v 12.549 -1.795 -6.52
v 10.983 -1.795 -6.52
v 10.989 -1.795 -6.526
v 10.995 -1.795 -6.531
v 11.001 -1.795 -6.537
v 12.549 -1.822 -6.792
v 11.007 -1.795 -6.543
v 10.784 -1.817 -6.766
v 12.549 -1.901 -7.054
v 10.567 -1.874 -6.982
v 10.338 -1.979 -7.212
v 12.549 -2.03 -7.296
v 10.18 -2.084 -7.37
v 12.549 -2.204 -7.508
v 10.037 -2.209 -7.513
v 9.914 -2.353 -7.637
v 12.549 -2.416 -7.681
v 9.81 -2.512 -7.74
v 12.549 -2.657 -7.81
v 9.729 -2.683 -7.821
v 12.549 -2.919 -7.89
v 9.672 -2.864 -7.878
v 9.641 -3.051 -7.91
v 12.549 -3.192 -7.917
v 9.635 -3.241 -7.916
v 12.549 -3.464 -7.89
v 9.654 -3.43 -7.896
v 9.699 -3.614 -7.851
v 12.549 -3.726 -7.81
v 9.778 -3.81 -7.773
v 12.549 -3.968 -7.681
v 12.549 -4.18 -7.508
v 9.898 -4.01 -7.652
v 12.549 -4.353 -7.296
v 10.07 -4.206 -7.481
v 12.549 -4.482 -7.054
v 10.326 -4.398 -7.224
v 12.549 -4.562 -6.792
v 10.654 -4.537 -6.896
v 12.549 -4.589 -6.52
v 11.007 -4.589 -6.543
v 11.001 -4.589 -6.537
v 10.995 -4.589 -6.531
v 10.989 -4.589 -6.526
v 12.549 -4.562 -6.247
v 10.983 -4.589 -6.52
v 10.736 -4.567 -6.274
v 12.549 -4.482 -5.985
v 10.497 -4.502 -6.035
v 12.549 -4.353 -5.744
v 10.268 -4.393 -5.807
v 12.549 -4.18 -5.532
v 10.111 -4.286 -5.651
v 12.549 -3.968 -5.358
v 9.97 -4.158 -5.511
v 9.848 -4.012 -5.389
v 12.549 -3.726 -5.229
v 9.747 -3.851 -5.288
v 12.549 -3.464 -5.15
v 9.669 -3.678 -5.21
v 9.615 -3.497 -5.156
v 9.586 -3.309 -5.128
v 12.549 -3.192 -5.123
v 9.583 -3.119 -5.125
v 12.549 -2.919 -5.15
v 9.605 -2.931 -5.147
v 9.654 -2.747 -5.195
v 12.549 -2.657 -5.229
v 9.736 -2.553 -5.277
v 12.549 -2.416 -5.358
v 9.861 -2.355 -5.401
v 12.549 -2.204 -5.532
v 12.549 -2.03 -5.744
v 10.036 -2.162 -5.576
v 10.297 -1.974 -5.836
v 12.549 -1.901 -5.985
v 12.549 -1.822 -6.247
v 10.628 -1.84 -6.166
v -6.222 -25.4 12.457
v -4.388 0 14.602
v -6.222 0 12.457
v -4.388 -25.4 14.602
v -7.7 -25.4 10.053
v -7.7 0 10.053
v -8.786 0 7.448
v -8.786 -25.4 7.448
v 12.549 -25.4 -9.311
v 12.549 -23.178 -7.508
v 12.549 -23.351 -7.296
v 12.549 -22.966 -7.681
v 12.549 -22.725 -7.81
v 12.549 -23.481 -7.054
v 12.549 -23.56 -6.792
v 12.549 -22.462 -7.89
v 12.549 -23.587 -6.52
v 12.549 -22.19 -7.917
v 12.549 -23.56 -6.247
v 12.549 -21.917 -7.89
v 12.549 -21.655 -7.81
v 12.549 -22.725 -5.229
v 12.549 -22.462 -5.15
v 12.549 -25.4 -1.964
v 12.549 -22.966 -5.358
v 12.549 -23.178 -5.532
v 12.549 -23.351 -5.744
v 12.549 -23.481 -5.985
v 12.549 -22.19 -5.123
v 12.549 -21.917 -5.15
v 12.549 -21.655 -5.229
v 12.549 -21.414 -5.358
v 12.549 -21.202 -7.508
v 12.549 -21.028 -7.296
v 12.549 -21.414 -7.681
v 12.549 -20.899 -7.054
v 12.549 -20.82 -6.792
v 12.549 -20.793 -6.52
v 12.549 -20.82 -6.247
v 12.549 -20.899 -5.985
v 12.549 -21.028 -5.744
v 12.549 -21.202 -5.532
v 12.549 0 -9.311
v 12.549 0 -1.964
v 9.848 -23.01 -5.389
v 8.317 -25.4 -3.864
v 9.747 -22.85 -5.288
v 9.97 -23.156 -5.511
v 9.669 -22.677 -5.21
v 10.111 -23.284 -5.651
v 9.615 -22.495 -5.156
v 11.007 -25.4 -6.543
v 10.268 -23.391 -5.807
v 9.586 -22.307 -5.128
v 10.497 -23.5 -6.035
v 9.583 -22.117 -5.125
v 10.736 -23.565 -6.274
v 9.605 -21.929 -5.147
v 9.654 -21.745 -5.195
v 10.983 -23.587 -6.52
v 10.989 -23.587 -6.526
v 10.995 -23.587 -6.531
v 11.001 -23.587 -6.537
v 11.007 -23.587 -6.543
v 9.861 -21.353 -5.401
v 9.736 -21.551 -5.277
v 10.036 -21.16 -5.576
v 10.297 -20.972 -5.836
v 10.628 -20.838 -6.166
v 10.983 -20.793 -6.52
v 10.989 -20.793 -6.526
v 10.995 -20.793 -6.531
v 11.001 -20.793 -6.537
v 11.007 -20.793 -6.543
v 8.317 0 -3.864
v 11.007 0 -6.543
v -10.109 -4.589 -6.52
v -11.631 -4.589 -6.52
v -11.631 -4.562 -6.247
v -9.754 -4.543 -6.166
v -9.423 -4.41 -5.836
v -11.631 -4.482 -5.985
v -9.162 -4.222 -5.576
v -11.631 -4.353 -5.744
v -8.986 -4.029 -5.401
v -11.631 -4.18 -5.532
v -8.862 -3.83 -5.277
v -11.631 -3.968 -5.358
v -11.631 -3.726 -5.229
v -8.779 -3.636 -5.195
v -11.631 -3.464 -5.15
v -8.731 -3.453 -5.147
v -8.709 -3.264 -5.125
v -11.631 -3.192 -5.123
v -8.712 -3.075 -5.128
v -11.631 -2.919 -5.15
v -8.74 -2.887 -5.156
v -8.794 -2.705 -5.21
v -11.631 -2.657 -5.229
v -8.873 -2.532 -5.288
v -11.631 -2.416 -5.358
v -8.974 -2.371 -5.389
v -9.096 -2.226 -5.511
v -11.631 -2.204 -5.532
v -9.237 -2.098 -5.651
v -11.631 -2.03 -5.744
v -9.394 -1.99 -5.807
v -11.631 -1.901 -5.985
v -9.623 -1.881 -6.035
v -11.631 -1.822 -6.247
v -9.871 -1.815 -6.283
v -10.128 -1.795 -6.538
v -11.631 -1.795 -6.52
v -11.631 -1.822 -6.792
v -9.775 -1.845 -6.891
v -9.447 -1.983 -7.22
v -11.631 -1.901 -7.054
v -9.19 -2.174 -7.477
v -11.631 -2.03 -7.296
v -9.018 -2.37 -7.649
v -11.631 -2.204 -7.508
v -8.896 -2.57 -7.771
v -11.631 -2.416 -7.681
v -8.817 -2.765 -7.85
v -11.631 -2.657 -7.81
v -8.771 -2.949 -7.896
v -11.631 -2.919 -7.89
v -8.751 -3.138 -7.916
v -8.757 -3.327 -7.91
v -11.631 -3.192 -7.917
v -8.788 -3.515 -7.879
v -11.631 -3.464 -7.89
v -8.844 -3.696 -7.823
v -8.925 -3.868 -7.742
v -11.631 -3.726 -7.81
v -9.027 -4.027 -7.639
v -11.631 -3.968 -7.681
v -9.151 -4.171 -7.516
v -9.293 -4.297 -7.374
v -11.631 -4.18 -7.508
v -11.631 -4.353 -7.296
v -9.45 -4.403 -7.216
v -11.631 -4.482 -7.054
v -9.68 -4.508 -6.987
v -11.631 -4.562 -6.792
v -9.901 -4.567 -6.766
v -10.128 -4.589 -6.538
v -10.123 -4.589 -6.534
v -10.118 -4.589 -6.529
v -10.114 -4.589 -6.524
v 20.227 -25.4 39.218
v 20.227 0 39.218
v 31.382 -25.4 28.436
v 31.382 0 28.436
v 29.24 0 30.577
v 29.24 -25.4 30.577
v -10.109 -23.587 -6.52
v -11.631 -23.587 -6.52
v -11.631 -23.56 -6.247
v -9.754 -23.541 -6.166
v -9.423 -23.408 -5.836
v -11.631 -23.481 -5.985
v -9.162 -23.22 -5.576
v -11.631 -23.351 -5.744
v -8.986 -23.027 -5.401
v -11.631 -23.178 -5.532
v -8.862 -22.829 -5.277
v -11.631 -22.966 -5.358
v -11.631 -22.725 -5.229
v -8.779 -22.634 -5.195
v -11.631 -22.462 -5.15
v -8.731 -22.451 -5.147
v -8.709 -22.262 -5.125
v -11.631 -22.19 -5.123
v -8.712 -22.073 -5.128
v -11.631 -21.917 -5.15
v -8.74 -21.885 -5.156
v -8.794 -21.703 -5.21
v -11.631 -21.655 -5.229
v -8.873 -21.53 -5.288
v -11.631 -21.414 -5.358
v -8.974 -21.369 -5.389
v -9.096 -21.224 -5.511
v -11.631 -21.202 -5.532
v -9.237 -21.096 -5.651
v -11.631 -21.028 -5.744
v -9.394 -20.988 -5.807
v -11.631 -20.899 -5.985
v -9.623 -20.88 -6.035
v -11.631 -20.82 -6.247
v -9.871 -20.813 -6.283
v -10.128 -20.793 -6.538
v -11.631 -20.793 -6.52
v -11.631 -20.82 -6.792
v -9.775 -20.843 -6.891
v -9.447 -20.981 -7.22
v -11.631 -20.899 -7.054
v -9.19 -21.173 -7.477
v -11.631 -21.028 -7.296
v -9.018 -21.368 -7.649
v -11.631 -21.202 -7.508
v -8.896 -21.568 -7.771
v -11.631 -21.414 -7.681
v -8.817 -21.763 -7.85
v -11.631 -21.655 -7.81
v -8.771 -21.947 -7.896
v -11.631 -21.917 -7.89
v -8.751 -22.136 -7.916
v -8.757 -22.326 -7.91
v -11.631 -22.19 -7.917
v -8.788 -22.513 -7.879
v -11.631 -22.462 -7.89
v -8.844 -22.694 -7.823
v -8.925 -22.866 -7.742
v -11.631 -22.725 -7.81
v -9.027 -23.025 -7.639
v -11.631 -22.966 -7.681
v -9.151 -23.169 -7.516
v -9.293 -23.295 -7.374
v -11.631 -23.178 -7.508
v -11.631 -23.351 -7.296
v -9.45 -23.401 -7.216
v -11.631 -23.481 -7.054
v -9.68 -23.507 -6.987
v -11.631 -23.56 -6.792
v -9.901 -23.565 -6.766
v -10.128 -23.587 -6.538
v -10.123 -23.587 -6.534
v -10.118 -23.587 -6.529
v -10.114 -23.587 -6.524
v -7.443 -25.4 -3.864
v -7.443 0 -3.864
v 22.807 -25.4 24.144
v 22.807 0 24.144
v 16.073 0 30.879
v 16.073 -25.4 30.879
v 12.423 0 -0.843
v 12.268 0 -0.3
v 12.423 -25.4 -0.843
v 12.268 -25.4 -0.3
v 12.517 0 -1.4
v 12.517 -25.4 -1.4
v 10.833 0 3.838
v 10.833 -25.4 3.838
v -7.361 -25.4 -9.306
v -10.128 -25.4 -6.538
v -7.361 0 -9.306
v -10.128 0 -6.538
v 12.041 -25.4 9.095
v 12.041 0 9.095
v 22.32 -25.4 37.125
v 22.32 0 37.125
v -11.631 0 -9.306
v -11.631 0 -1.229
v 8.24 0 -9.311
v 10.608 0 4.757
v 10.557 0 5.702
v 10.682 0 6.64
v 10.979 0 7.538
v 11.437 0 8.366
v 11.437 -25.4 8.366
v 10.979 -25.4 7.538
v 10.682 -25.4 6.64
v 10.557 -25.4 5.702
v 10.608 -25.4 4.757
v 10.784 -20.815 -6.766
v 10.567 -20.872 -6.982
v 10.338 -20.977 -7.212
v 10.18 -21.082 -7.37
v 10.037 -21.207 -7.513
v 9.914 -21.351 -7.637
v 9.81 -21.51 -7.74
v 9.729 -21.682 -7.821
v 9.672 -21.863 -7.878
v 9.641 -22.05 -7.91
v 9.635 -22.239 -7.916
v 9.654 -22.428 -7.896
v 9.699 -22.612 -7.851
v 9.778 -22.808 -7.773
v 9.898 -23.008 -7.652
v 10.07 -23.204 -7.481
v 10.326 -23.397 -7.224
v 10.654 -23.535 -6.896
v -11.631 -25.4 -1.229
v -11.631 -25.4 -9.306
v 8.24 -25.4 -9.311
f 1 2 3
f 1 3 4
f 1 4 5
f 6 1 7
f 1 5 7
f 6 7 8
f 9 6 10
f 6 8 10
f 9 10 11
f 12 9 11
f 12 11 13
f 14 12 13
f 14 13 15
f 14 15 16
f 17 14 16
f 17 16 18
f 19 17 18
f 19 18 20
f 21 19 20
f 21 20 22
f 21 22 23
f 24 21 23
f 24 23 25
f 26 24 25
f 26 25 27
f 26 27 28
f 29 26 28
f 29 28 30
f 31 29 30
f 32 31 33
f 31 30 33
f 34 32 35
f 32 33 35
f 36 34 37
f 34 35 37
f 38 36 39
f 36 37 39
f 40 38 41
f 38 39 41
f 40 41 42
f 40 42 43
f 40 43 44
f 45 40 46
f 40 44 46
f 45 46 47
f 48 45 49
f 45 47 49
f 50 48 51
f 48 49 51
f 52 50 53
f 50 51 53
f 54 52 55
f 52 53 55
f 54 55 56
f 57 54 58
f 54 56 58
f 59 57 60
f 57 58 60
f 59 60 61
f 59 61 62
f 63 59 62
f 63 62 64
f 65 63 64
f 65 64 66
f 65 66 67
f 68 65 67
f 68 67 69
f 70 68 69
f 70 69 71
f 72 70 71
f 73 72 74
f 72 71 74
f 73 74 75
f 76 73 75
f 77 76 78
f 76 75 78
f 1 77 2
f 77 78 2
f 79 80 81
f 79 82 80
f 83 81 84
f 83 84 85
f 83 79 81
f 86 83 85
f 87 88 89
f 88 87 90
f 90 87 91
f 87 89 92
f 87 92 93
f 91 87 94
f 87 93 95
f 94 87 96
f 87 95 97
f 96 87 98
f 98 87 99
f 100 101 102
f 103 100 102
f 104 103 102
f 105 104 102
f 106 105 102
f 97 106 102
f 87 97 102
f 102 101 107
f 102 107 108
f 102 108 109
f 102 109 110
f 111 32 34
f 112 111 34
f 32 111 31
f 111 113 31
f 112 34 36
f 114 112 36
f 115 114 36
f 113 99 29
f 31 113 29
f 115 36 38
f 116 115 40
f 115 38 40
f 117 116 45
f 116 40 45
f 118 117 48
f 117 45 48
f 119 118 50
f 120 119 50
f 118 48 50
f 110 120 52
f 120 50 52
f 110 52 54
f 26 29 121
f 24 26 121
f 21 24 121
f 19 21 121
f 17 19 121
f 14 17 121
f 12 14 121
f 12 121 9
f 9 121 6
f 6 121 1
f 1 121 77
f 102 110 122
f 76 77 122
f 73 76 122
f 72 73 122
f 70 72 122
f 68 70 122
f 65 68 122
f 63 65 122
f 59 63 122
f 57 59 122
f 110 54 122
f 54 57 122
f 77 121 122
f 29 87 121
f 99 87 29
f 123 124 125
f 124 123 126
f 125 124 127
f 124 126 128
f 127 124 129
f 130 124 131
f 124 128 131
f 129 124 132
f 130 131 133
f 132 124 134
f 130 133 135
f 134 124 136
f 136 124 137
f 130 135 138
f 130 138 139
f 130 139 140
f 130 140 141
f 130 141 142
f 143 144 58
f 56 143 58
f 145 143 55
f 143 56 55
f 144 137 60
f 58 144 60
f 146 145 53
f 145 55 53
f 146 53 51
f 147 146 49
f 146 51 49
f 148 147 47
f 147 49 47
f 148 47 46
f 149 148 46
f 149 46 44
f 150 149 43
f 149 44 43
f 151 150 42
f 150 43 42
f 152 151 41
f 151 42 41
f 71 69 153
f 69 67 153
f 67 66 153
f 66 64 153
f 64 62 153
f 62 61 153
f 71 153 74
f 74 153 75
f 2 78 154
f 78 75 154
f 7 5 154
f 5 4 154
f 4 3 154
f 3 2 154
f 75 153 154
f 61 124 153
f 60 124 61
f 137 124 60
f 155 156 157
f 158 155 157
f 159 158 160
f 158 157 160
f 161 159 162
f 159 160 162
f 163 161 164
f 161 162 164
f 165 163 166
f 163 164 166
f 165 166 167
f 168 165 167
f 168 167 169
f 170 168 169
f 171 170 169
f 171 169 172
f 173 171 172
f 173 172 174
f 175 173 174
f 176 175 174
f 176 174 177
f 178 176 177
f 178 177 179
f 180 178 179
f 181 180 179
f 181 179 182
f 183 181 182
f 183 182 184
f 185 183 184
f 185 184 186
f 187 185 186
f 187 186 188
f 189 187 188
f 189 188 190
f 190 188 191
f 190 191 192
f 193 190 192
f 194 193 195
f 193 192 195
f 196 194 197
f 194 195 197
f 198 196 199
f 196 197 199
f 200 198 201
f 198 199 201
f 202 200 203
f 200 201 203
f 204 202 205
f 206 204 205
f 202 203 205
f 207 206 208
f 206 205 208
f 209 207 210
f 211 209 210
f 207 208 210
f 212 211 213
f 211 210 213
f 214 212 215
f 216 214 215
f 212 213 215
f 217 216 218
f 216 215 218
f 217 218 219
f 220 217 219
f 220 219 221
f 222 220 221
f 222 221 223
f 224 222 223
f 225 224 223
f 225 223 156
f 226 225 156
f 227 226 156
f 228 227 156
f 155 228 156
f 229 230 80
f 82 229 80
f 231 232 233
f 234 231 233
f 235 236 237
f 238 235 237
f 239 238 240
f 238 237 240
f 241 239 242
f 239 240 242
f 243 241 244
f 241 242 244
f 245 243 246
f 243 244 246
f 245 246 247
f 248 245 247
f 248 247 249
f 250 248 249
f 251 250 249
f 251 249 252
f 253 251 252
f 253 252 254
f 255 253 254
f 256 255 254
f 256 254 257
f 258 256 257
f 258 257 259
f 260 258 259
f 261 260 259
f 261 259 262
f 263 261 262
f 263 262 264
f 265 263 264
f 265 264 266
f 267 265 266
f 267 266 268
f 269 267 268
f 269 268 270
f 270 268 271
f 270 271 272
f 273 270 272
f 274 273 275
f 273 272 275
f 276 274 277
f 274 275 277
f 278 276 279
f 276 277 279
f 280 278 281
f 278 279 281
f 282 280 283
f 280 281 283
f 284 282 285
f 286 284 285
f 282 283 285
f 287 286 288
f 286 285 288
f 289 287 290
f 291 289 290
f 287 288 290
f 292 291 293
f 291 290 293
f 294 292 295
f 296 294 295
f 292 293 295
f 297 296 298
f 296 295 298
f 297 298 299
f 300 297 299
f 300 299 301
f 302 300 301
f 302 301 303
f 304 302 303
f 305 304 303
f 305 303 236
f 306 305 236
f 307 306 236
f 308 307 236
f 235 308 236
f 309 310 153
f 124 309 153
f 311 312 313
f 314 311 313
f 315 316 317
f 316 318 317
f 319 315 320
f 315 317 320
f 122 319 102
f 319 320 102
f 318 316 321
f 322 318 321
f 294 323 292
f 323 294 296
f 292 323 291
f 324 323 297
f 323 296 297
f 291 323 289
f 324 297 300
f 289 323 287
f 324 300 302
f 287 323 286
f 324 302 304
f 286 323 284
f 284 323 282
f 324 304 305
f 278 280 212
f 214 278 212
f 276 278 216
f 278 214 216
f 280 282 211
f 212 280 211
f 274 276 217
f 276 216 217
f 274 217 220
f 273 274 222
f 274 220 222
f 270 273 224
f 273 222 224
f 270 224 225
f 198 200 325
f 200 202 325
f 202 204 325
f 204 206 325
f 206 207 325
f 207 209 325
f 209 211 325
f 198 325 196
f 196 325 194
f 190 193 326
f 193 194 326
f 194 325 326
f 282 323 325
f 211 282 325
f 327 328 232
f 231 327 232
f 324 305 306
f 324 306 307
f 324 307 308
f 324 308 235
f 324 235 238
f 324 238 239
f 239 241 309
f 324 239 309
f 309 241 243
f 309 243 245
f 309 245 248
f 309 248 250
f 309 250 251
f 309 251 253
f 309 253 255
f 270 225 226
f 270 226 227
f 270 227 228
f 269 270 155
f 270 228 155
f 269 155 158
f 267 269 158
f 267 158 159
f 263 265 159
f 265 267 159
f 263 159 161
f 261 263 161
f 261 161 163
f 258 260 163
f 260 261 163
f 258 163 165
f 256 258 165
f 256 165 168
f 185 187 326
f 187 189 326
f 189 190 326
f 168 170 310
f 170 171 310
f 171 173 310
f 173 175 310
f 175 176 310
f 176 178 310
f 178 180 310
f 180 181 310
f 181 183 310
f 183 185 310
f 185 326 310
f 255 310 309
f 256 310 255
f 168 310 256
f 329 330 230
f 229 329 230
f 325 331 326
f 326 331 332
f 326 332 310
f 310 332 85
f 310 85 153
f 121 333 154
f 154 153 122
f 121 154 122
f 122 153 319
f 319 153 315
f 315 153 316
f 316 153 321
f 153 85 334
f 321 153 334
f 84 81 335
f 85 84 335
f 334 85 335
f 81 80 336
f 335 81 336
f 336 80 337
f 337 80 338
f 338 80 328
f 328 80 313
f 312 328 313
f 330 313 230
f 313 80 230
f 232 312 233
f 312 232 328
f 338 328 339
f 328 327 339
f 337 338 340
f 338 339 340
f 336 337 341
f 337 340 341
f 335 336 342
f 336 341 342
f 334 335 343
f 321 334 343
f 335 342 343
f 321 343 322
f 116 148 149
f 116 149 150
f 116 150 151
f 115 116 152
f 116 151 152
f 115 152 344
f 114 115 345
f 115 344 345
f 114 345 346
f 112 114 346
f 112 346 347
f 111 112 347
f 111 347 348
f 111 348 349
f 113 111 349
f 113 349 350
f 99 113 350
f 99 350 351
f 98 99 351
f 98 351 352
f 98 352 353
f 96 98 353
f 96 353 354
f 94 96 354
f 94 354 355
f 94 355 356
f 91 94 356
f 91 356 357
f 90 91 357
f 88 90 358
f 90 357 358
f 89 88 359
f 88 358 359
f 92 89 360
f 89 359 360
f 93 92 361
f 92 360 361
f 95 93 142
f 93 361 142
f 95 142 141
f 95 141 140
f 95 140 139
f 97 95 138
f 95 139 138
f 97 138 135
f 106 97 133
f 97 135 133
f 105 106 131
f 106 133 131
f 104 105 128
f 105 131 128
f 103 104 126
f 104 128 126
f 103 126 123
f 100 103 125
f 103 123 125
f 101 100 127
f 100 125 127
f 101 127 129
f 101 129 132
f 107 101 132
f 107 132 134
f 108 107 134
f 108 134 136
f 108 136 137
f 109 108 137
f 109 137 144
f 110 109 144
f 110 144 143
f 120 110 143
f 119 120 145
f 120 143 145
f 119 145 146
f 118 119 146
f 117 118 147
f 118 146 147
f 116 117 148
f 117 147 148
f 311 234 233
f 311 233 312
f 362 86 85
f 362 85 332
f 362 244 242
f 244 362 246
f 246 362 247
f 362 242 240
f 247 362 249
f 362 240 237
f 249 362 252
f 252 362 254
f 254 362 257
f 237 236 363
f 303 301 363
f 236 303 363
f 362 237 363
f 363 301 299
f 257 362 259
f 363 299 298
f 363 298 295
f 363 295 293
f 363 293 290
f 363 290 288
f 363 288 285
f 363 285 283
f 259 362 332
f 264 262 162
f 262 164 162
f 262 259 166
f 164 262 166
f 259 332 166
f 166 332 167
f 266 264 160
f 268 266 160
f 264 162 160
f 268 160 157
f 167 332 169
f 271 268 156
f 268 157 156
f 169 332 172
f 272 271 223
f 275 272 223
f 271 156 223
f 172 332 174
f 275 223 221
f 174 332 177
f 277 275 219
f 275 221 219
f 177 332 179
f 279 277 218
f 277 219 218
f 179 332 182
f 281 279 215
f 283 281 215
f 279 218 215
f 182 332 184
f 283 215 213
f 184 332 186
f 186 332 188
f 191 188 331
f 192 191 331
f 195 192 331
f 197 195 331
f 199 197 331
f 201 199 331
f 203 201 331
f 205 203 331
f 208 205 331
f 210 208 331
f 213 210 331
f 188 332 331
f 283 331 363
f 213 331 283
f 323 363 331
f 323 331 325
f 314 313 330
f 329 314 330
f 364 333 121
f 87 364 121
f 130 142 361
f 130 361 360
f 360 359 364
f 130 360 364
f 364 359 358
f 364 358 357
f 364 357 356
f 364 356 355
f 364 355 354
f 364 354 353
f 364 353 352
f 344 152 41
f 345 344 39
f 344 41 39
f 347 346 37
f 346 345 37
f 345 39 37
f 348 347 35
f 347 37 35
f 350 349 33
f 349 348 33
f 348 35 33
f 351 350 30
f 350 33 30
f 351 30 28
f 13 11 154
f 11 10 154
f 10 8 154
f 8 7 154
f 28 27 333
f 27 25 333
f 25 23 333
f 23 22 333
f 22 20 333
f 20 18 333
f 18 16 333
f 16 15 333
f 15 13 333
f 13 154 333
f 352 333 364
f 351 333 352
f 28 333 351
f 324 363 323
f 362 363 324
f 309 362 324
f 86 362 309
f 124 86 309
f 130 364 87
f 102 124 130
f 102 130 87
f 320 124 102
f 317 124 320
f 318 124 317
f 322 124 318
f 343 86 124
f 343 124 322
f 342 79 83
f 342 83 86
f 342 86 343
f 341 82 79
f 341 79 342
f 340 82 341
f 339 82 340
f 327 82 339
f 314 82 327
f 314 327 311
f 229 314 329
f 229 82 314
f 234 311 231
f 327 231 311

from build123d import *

# Parameters (mm, degrees)
F1_DEPTH = 25.4
F3_D     = 2.794
F3_DEPTH = 25.4
F3_TIP   = 0.8394022848
F4_D     = 2.794
F4_DEPTH = 25.4
F4_START = 10.1278152
F4_TIP   = 0.8394022848
F5_R     = 18.0883597705
F6_R     = 5.08


# Not quite as in the source:
# - ends of sketch curves that miss each other by under 0.0002 mm in the source are joined
# - a feature names something its author has since deleted; it is built from what else it names


with BuildPart() as f1:
    # F0 (on Front) → F1 (new body)
    with BuildSketch(Plane.XZ):
        Polygon((11.0066256276, -6.5430273301), (8.240193387, -9.310965985), (12.5485987193, -9.310965985), (12.5485987193, -1.1086727812), (9.7906497979, 6.8444932552), (24.9488617122, 22.0027051695), (31.3820510637, 28.435894521), (29.2404852808, 30.5774603039), (22.8072959293, 24.1442709524), (16.0729033236, 30.8786635582), (22.3196721338, 37.1254323684), (20.2273843878, 39.2177201144), (14.0302290969, 33.0205648235), (13.9806155776, 32.9709513042), (-7.4406042695, 11.5497314571), (-11.6305711889, -1.2286720797), (-11.6305711889, -9.3063699081), (-7.3613829189, -9.3063699081), (-10.1278151595, -6.5384312532), (-7.4425795762, -3.8636476732), (8.3167760077, -3.8636476732), align=None)
    extrude(amount=F1_DEPTH)

    # F3 (one way)
    with BuildSketch(Plane(origin=(0, 0, 0), x_dir=(0, 1, 0), z_dir=(-1, 0, 0))):
        with Locations((-22.1899207681, 6.5197679214), (-3.1917574815, 6.5197679214)):
            Circle(F3_D / 2)
    extrude(amount=-F3_DEPTH, mode=Mode.SUBTRACT)
    with Locations(Plane(origin=(0, 0, 0), x_dir=(0, 1, 0), z_dir=(-1, 0, 0))):
        with Locations((-22.1899207681, 6.5197679214), (-3.1917574815, 6.5197679214)):
            with Locations((0, 0, -(F3_DEPTH + F3_TIP / 2))):  # 118° drill point
                Cone(0, F3_D / 2, F3_TIP, mode=Mode.SUBTRACT)

    # F4
    # its depths count from where the whole tool has entered the part; down to there all is cleared
    with Locations(Plane.YZ.offset(-F4_START)):
        with Locations((-3.1917574815, -6.5197679214), (-22.1899207681, -6.5197679214)):
            Hole(F4_D / 2, depth=F4_DEPTH)
            with Locations((0, 0, -(F4_DEPTH + F4_TIP / 2))):  # 118° drill point
                Cone(0, F4_D / 2, F4_TIP, mode=Mode.SUBTRACT)

    # F5
    f5_edges = [f1.edges().sort_by_distance(p)[0] for p in [
        (-7.440604, -12.7, 11.549731),
    ]]
    fillet(f5_edges, radius=F5_R)

    # F6
    f6_edges = [f1.edges().sort_by_distance(p)[0] for p in [
        (9.79065, -12.7, 6.844493),
        (12.548599, -12.7, -1.108673),
    ]]
    fillet(f6_edges, radius=F6_R)


solid = f1.part
